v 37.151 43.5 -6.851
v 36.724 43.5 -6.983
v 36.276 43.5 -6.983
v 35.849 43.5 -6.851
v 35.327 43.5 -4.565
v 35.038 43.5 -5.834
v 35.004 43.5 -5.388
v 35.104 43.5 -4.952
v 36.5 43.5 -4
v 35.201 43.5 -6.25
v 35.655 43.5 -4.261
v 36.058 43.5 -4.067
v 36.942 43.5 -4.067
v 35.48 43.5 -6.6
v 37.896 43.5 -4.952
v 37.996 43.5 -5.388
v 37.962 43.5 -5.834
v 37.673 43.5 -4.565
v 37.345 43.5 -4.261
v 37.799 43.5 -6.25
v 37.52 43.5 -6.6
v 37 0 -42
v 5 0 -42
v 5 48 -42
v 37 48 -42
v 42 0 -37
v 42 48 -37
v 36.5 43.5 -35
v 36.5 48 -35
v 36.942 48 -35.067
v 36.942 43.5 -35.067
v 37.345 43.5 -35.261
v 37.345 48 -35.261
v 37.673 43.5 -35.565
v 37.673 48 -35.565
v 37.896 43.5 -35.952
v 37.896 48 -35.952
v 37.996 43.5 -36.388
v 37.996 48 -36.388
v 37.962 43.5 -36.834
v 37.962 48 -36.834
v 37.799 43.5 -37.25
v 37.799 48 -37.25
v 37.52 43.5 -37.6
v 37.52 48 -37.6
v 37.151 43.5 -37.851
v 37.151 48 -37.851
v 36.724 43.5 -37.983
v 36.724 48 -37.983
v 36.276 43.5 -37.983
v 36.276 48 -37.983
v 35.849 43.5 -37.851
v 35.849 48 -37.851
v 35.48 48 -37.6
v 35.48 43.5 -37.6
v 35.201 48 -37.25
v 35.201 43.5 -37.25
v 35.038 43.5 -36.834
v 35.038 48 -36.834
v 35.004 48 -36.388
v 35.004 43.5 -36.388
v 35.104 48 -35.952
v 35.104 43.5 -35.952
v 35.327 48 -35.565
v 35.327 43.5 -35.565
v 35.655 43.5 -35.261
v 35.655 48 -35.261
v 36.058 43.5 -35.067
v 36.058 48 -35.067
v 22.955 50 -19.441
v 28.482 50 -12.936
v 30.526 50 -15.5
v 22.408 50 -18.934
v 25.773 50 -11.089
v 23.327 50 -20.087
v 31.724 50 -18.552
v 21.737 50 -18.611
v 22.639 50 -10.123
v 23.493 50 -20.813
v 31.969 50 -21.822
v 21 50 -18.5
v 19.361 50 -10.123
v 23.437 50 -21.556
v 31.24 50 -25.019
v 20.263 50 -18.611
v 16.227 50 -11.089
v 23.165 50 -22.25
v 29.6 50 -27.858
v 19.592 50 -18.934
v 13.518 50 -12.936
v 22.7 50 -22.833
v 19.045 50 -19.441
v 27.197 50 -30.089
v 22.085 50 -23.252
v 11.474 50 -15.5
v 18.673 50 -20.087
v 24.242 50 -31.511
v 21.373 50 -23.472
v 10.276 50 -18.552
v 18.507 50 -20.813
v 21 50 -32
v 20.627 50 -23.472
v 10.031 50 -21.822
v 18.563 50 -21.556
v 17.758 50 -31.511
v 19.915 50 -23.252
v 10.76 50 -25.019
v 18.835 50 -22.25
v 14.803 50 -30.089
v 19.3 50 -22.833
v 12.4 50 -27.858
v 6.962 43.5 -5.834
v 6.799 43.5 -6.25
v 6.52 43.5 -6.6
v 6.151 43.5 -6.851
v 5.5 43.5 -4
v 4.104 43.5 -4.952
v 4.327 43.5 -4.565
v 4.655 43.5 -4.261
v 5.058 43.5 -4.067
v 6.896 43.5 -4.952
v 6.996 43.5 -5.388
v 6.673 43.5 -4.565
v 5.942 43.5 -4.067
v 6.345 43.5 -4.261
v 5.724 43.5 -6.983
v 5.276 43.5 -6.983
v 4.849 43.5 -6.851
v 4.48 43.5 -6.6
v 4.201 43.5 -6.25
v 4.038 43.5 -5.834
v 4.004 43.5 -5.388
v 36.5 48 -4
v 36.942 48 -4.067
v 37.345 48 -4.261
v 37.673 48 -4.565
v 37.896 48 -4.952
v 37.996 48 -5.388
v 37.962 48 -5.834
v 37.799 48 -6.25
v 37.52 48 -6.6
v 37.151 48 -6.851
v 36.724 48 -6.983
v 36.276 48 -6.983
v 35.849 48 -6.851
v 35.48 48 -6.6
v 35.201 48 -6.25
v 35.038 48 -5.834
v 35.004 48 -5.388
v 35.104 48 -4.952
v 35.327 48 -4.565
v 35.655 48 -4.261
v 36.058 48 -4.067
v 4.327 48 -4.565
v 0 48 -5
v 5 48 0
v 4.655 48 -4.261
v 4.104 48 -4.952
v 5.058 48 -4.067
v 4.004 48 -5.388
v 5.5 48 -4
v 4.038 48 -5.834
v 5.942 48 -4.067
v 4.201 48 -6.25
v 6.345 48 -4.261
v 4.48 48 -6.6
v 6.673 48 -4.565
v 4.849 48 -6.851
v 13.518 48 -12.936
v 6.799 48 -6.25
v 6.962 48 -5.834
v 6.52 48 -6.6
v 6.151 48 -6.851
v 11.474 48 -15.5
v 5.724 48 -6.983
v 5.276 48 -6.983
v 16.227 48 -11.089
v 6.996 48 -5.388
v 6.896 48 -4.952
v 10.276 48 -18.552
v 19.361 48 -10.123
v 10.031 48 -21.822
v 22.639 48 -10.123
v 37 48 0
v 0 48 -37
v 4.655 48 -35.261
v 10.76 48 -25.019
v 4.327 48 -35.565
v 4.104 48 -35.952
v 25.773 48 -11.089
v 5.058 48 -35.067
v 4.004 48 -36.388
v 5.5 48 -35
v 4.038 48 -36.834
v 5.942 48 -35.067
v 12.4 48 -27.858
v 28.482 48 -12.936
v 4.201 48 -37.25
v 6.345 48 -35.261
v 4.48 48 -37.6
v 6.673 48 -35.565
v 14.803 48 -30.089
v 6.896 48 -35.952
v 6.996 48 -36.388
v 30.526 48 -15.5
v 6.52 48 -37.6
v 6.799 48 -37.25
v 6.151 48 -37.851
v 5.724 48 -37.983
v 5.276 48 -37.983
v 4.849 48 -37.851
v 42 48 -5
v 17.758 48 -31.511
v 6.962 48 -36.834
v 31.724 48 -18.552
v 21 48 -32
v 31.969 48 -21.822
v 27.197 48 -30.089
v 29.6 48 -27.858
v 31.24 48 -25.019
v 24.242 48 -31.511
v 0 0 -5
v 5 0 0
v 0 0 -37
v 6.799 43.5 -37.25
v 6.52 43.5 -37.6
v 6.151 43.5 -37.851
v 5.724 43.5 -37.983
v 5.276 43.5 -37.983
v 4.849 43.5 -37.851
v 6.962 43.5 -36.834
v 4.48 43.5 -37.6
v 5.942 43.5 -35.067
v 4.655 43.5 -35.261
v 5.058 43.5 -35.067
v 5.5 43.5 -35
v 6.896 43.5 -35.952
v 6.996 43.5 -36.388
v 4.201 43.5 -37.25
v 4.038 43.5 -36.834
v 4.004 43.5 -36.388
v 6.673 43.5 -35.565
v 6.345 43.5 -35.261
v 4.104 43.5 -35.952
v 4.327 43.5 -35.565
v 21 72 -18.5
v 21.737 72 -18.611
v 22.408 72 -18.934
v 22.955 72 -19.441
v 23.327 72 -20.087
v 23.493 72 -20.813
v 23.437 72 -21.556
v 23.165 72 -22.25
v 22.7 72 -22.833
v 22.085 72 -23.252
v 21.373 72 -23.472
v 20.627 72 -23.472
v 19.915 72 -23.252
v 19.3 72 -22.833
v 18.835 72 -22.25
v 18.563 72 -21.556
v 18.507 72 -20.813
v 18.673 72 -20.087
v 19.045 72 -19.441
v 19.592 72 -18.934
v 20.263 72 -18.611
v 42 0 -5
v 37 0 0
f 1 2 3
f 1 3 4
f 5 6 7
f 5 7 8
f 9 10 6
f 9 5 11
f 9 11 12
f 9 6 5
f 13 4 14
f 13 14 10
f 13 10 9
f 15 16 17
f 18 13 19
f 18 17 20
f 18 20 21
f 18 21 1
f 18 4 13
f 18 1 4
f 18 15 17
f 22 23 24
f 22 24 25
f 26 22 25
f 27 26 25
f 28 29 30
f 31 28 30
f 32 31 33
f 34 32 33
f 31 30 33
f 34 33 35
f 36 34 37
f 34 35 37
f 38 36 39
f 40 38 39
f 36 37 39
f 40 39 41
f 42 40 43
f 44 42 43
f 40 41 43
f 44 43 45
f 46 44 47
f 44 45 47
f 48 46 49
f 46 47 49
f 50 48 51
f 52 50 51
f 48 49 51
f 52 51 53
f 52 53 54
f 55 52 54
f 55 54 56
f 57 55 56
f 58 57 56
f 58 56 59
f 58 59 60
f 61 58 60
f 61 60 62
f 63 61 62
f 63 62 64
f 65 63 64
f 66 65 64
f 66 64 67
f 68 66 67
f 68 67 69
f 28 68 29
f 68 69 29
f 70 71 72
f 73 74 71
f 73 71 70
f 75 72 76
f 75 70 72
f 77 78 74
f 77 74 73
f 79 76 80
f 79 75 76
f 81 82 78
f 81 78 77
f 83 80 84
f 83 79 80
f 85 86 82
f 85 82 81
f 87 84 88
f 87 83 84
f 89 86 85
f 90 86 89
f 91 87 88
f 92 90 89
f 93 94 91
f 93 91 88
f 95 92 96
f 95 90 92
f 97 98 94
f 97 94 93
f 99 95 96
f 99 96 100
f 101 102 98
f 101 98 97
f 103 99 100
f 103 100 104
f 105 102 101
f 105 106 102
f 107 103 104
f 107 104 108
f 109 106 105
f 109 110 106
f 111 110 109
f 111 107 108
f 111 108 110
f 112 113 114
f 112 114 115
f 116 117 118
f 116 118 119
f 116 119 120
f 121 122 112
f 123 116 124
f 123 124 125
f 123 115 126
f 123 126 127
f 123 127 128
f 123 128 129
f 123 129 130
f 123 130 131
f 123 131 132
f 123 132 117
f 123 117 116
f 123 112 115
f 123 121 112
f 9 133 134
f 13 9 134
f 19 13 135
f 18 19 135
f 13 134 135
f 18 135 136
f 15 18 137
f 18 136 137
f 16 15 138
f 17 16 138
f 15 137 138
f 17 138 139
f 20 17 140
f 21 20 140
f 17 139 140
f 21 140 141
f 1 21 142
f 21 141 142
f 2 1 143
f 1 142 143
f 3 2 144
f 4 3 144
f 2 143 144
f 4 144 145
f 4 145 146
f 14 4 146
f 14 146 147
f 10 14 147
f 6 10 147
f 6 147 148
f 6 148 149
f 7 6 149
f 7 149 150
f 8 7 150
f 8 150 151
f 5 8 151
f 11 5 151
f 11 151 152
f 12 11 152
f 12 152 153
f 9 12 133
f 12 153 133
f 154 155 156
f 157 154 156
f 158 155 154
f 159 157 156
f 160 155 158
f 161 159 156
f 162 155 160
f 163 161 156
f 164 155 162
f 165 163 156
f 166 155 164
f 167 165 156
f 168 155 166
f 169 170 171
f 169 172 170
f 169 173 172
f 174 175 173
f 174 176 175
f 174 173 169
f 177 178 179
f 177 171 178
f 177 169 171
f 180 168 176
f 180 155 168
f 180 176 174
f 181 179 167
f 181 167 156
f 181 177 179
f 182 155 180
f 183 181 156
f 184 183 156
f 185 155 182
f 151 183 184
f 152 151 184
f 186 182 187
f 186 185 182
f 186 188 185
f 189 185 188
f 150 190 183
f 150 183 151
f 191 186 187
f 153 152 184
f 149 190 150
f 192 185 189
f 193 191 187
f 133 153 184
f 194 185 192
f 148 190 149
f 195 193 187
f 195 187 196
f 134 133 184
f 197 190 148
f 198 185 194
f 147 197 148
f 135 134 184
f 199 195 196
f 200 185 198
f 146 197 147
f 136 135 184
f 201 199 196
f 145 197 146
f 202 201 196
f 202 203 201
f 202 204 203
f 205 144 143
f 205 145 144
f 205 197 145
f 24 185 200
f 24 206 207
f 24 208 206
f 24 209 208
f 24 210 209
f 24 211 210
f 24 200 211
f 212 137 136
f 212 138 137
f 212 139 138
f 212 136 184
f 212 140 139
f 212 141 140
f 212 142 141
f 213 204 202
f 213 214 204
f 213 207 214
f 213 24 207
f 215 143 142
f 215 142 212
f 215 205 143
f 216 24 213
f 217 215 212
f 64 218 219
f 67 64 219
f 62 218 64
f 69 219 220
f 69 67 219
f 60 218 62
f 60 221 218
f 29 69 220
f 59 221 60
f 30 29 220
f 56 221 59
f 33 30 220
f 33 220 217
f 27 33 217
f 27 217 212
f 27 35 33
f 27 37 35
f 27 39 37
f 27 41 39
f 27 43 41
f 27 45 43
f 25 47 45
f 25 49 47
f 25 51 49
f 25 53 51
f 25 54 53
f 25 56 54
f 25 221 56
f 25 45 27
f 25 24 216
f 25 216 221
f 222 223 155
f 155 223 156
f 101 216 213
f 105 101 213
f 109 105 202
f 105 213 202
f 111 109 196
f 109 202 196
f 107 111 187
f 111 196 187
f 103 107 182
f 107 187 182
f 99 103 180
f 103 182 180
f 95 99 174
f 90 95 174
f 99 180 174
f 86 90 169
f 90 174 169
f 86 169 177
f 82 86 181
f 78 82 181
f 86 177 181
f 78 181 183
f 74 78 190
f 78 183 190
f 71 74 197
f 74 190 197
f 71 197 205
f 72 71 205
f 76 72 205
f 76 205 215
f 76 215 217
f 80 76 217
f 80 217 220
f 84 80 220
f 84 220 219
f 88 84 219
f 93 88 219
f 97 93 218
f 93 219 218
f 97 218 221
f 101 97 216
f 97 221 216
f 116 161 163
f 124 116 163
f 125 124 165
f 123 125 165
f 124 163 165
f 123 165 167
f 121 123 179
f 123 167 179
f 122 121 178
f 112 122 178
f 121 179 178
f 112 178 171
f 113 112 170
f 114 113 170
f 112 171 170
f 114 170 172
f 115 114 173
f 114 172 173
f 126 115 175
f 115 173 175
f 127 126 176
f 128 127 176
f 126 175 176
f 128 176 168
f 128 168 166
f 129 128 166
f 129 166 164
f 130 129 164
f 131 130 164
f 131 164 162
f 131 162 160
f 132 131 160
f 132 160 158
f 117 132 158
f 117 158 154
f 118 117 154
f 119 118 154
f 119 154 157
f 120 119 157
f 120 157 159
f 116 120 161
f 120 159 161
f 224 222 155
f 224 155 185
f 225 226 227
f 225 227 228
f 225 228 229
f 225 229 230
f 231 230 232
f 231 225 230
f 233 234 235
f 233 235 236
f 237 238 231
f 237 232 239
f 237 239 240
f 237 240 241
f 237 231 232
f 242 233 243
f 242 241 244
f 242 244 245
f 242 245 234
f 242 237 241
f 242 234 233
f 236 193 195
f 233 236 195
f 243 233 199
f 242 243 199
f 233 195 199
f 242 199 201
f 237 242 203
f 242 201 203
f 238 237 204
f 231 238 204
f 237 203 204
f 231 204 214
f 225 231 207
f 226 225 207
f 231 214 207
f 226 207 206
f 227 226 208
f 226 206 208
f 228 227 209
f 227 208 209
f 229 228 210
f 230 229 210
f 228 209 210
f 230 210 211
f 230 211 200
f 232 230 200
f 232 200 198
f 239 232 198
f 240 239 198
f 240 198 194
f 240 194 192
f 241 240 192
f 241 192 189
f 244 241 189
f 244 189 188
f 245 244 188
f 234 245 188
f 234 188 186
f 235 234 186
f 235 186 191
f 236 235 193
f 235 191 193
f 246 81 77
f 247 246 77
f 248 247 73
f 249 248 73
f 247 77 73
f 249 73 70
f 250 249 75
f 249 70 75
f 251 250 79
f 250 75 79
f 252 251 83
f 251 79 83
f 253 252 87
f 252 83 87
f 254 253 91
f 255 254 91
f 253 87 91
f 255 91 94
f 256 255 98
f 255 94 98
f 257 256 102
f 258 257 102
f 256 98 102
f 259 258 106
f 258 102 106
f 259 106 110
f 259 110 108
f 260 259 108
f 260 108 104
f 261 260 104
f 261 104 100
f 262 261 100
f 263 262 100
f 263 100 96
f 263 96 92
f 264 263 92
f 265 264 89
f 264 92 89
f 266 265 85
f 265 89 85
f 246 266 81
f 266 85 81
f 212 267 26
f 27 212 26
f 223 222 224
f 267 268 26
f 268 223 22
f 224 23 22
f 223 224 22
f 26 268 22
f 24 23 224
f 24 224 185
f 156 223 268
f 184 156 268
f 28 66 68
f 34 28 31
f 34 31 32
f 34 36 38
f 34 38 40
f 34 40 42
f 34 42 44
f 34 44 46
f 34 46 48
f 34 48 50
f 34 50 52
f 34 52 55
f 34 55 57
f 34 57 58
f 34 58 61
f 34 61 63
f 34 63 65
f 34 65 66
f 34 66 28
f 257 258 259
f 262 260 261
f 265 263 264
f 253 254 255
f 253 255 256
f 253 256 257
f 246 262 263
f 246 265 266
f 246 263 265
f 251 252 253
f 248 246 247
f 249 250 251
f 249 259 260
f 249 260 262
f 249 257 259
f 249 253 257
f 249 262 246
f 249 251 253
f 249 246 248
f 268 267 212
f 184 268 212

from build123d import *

# Parameters (mm, degrees)
SKETCH1_W           = 42
SKETCH1_H           = 42
BOSS_EXTRUDE1_DEPTH = 48
CHAMFER1_SIZE       = 5
SKETCH2_R           = 1.5
CUT_EXTRUDE1_DEPTH  = 4.5
SKETCH3_R           = 11
BOSS_EXTRUDE2_DEPTH = 2
SKETCH4_R           = 2.5
BOSS_EXTRUDE3_DEPTH = 22


with BuildPart() as part:
    # Sketch1 → Boss-Extrude1 (new body)
    with BuildSketch(Plane(origin=(0, 0, 0), x_dir=(1, 0, 0), z_dir=(0, 1, 0))):
        with Locations((21, 21)):
            Rectangle(SKETCH1_W, SKETCH1_H)
    extrude(amount=BOSS_EXTRUDE1_DEPTH)

    # Chamfer1
    chamfer1_edges = [part.edges().sort_by_distance(p)[0] for p in [
        (0, 24, -42),
        (42, 24, -42),
        (42, 24, 0),
        (0, 24, 0),
    ]]
    chamfer(chamfer1_edges, length=CHAMFER1_SIZE)

    # Sketch2 → Cut-Extrude1 (cut)
    with BuildSketch(Plane(origin=(0, 48, 0), x_dir=(1, 0, 0), z_dir=(0, 1, 0))):
        with Locations(Location((5.5, 36.5, 0), (0, 0, 270))):
            Circle(SKETCH2_R)
        with Locations(Location((36.5, 36.5, 0), (0, 0, 270))):
            Circle(SKETCH2_R)
        with Locations(Location((5.5, 5.5, 0), (0, 0, 270))):
            Circle(SKETCH2_R)
        with Locations(Location((36.5, 5.5, 0), (0, 0, 270))):
            Circle(SKETCH2_R)
    extrude(amount=-CUT_EXTRUDE1_DEPTH, mode=Mode.SUBTRACT)

    # Sketch3 → Boss-Extrude2 (add)
    with BuildSketch(Plane(origin=(0, 48, 0), x_dir=(1, 0, 0), z_dir=(0, 1, 0))):
        with Locations(Location((21, 21, 0), (0, 0, 90))):
            Circle(SKETCH3_R)
    extrude(amount=BOSS_EXTRUDE2_DEPTH)

    # Sketch4 → Boss-Extrude3 (add)
    with BuildSketch(Plane(origin=(0, 50, 0), x_dir=(1, 0, 0), z_dir=(0, 1, 0))):
        with Locations(Location((21, 21, 0), (0, 0, 270))):
            Circle(SKETCH4_R)
    extrude(amount=BOSS_EXTRUDE3_DEPTH)


solid = part.part
